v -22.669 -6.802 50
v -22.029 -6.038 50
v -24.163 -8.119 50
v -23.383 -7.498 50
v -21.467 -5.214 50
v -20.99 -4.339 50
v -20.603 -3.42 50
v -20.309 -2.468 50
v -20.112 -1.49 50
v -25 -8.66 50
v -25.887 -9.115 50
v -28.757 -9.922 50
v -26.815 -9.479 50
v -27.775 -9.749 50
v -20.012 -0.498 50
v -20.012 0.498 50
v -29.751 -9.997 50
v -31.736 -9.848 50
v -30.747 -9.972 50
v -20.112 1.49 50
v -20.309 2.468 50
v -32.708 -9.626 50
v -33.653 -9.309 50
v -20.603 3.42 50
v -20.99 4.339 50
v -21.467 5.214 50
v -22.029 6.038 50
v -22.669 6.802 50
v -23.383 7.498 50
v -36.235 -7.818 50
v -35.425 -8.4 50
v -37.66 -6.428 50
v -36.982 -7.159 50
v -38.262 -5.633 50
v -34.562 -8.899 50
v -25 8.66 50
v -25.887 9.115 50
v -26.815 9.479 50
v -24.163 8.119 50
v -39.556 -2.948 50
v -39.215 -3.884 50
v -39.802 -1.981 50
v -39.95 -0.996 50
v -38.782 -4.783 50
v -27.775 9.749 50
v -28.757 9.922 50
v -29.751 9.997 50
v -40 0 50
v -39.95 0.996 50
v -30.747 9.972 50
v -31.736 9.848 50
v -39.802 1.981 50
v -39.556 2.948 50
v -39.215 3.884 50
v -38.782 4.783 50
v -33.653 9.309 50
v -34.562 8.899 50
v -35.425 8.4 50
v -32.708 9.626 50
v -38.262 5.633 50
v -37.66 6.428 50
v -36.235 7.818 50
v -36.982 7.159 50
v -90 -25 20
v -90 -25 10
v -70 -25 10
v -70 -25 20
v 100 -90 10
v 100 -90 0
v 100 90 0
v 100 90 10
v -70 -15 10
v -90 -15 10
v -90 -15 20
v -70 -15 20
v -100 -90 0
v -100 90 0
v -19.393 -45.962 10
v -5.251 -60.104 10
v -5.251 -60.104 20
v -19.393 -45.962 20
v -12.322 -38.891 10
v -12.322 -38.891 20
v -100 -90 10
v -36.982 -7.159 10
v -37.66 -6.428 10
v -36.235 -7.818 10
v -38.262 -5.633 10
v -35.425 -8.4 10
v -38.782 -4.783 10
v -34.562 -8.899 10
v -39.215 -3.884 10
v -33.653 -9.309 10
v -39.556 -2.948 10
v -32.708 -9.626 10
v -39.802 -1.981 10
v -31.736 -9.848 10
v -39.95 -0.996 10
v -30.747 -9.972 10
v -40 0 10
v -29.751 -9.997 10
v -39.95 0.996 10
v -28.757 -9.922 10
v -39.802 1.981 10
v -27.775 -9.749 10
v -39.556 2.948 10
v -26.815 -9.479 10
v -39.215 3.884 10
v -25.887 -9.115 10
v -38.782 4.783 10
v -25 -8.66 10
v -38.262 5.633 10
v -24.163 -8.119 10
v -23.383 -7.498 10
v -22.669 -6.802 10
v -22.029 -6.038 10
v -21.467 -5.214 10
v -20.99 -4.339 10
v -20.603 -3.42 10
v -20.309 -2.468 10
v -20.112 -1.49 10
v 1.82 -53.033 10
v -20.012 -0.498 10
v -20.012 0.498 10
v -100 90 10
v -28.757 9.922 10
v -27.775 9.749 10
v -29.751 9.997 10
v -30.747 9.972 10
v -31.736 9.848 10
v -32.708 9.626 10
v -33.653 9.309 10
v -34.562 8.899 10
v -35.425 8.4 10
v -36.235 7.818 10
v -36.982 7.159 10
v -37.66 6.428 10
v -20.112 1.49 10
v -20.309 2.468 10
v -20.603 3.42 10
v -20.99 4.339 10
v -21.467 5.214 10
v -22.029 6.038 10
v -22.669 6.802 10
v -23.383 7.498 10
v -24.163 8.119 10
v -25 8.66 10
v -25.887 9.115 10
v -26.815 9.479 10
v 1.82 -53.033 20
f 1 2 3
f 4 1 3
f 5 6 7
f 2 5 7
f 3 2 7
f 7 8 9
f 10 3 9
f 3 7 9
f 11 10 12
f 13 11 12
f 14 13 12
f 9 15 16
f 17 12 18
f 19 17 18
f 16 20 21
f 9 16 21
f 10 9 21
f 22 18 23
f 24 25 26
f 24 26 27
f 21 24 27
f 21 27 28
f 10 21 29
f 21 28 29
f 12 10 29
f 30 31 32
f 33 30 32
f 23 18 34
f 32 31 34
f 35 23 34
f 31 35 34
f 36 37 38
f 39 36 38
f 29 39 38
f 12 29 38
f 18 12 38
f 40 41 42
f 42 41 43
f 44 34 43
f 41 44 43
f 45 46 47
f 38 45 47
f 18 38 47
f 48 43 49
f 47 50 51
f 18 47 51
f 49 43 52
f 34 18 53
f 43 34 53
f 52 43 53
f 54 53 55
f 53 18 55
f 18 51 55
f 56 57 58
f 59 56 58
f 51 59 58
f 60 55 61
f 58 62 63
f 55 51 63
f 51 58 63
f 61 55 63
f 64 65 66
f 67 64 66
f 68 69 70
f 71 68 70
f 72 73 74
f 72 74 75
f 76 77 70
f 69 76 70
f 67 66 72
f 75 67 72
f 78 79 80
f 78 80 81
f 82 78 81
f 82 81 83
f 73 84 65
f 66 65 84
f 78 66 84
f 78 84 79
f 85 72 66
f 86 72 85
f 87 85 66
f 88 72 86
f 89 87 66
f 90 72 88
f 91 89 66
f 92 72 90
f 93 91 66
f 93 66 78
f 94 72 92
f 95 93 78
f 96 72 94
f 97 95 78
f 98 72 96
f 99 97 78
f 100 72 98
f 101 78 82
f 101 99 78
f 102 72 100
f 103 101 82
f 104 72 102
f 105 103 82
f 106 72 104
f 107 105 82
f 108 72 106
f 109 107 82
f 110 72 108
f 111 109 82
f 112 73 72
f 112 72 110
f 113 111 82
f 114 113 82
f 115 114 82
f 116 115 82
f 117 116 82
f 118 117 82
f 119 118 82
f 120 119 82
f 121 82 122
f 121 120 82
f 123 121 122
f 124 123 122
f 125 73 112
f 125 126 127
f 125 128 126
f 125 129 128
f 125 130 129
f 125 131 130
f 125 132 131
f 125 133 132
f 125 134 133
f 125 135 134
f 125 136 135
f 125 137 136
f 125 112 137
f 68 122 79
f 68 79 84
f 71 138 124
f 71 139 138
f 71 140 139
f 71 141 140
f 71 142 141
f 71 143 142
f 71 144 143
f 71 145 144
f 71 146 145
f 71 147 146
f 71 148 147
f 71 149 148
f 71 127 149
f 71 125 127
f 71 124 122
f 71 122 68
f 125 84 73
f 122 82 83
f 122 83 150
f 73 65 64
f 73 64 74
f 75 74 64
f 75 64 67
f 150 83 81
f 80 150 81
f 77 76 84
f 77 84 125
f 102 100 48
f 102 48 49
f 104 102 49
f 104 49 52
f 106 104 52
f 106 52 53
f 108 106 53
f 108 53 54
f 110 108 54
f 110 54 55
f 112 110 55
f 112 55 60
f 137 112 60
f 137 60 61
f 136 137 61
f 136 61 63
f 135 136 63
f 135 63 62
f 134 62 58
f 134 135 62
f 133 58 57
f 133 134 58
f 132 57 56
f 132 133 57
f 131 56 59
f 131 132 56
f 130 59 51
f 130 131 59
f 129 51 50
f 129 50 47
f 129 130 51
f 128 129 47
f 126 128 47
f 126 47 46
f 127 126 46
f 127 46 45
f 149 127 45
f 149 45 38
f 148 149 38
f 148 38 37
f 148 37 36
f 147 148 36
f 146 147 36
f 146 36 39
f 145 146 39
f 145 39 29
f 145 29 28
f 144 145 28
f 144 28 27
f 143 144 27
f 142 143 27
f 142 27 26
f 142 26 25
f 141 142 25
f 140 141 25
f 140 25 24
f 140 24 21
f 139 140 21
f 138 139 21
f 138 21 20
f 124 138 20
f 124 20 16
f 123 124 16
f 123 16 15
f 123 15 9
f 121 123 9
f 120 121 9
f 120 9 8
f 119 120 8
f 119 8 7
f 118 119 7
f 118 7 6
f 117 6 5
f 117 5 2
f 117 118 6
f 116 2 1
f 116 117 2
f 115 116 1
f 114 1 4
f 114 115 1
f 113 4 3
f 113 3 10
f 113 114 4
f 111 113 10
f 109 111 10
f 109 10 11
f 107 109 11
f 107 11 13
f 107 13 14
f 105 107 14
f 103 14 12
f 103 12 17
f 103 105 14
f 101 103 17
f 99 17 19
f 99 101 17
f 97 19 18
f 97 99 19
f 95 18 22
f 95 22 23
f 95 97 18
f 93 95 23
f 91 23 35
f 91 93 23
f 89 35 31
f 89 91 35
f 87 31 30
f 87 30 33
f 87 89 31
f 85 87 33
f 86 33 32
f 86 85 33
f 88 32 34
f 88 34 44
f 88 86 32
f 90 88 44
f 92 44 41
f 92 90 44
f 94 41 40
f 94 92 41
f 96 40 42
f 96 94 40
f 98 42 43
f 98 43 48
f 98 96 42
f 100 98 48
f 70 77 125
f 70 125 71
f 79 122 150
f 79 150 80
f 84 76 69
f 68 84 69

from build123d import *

# Parameters (mm, degrees)
ESQUISSE1_W        = 200
ESQUISSE1_H        = 180
ESQUISSE1_R        = 10
BOSS_EXTRU_1_DEPTH = 10
ESQUISSE3_R        = 10
BOSS_EXTRU_2_DEPTH = 50
ESQUISSE4_W        = 20
ESQUISSE4_H        = 10
BOSS_EXTRU_3_DEPTH = 10


with BuildPart() as part:
    # Esquisse1 → Boss.-Extru.1 (new body)
    with BuildSketch(Plane.XY):
        Rectangle(ESQUISSE1_W, ESQUISSE1_H)
        with Locations((-30, 0)):
            Circle(ESQUISSE1_R, mode=Mode.SUBTRACT)
    extrude(amount=BOSS_EXTRU_1_DEPTH)

    # Esquisse3 → Boss.-Extru.2 (add)
    with BuildSketch(Plane(origin=(0, 0, 0), x_dir=(-1, 0, 0), z_dir=(0, 0, -1))):
        with Locations((30, 0)):
            Circle(ESQUISSE3_R)
    extrude(amount=-BOSS_EXTRU_2_DEPTH)

    # Esquisse4 → Boss.-Extru.3 (add)
    with BuildSketch(Plane.XY.offset(10)):
        with Locations((-80, -20)):
            Rectangle(ESQUISSE4_W, ESQUISSE4_H)
        Polygon((-12.32233047, -38.890872965), (1.819805153, -53.033008589), (-5.251262658, -60.104076401), (-19.393398282, -45.961940777), align=None)
    extrude(amount=BOSS_EXTRU_3_DEPTH)


solid = part.part
